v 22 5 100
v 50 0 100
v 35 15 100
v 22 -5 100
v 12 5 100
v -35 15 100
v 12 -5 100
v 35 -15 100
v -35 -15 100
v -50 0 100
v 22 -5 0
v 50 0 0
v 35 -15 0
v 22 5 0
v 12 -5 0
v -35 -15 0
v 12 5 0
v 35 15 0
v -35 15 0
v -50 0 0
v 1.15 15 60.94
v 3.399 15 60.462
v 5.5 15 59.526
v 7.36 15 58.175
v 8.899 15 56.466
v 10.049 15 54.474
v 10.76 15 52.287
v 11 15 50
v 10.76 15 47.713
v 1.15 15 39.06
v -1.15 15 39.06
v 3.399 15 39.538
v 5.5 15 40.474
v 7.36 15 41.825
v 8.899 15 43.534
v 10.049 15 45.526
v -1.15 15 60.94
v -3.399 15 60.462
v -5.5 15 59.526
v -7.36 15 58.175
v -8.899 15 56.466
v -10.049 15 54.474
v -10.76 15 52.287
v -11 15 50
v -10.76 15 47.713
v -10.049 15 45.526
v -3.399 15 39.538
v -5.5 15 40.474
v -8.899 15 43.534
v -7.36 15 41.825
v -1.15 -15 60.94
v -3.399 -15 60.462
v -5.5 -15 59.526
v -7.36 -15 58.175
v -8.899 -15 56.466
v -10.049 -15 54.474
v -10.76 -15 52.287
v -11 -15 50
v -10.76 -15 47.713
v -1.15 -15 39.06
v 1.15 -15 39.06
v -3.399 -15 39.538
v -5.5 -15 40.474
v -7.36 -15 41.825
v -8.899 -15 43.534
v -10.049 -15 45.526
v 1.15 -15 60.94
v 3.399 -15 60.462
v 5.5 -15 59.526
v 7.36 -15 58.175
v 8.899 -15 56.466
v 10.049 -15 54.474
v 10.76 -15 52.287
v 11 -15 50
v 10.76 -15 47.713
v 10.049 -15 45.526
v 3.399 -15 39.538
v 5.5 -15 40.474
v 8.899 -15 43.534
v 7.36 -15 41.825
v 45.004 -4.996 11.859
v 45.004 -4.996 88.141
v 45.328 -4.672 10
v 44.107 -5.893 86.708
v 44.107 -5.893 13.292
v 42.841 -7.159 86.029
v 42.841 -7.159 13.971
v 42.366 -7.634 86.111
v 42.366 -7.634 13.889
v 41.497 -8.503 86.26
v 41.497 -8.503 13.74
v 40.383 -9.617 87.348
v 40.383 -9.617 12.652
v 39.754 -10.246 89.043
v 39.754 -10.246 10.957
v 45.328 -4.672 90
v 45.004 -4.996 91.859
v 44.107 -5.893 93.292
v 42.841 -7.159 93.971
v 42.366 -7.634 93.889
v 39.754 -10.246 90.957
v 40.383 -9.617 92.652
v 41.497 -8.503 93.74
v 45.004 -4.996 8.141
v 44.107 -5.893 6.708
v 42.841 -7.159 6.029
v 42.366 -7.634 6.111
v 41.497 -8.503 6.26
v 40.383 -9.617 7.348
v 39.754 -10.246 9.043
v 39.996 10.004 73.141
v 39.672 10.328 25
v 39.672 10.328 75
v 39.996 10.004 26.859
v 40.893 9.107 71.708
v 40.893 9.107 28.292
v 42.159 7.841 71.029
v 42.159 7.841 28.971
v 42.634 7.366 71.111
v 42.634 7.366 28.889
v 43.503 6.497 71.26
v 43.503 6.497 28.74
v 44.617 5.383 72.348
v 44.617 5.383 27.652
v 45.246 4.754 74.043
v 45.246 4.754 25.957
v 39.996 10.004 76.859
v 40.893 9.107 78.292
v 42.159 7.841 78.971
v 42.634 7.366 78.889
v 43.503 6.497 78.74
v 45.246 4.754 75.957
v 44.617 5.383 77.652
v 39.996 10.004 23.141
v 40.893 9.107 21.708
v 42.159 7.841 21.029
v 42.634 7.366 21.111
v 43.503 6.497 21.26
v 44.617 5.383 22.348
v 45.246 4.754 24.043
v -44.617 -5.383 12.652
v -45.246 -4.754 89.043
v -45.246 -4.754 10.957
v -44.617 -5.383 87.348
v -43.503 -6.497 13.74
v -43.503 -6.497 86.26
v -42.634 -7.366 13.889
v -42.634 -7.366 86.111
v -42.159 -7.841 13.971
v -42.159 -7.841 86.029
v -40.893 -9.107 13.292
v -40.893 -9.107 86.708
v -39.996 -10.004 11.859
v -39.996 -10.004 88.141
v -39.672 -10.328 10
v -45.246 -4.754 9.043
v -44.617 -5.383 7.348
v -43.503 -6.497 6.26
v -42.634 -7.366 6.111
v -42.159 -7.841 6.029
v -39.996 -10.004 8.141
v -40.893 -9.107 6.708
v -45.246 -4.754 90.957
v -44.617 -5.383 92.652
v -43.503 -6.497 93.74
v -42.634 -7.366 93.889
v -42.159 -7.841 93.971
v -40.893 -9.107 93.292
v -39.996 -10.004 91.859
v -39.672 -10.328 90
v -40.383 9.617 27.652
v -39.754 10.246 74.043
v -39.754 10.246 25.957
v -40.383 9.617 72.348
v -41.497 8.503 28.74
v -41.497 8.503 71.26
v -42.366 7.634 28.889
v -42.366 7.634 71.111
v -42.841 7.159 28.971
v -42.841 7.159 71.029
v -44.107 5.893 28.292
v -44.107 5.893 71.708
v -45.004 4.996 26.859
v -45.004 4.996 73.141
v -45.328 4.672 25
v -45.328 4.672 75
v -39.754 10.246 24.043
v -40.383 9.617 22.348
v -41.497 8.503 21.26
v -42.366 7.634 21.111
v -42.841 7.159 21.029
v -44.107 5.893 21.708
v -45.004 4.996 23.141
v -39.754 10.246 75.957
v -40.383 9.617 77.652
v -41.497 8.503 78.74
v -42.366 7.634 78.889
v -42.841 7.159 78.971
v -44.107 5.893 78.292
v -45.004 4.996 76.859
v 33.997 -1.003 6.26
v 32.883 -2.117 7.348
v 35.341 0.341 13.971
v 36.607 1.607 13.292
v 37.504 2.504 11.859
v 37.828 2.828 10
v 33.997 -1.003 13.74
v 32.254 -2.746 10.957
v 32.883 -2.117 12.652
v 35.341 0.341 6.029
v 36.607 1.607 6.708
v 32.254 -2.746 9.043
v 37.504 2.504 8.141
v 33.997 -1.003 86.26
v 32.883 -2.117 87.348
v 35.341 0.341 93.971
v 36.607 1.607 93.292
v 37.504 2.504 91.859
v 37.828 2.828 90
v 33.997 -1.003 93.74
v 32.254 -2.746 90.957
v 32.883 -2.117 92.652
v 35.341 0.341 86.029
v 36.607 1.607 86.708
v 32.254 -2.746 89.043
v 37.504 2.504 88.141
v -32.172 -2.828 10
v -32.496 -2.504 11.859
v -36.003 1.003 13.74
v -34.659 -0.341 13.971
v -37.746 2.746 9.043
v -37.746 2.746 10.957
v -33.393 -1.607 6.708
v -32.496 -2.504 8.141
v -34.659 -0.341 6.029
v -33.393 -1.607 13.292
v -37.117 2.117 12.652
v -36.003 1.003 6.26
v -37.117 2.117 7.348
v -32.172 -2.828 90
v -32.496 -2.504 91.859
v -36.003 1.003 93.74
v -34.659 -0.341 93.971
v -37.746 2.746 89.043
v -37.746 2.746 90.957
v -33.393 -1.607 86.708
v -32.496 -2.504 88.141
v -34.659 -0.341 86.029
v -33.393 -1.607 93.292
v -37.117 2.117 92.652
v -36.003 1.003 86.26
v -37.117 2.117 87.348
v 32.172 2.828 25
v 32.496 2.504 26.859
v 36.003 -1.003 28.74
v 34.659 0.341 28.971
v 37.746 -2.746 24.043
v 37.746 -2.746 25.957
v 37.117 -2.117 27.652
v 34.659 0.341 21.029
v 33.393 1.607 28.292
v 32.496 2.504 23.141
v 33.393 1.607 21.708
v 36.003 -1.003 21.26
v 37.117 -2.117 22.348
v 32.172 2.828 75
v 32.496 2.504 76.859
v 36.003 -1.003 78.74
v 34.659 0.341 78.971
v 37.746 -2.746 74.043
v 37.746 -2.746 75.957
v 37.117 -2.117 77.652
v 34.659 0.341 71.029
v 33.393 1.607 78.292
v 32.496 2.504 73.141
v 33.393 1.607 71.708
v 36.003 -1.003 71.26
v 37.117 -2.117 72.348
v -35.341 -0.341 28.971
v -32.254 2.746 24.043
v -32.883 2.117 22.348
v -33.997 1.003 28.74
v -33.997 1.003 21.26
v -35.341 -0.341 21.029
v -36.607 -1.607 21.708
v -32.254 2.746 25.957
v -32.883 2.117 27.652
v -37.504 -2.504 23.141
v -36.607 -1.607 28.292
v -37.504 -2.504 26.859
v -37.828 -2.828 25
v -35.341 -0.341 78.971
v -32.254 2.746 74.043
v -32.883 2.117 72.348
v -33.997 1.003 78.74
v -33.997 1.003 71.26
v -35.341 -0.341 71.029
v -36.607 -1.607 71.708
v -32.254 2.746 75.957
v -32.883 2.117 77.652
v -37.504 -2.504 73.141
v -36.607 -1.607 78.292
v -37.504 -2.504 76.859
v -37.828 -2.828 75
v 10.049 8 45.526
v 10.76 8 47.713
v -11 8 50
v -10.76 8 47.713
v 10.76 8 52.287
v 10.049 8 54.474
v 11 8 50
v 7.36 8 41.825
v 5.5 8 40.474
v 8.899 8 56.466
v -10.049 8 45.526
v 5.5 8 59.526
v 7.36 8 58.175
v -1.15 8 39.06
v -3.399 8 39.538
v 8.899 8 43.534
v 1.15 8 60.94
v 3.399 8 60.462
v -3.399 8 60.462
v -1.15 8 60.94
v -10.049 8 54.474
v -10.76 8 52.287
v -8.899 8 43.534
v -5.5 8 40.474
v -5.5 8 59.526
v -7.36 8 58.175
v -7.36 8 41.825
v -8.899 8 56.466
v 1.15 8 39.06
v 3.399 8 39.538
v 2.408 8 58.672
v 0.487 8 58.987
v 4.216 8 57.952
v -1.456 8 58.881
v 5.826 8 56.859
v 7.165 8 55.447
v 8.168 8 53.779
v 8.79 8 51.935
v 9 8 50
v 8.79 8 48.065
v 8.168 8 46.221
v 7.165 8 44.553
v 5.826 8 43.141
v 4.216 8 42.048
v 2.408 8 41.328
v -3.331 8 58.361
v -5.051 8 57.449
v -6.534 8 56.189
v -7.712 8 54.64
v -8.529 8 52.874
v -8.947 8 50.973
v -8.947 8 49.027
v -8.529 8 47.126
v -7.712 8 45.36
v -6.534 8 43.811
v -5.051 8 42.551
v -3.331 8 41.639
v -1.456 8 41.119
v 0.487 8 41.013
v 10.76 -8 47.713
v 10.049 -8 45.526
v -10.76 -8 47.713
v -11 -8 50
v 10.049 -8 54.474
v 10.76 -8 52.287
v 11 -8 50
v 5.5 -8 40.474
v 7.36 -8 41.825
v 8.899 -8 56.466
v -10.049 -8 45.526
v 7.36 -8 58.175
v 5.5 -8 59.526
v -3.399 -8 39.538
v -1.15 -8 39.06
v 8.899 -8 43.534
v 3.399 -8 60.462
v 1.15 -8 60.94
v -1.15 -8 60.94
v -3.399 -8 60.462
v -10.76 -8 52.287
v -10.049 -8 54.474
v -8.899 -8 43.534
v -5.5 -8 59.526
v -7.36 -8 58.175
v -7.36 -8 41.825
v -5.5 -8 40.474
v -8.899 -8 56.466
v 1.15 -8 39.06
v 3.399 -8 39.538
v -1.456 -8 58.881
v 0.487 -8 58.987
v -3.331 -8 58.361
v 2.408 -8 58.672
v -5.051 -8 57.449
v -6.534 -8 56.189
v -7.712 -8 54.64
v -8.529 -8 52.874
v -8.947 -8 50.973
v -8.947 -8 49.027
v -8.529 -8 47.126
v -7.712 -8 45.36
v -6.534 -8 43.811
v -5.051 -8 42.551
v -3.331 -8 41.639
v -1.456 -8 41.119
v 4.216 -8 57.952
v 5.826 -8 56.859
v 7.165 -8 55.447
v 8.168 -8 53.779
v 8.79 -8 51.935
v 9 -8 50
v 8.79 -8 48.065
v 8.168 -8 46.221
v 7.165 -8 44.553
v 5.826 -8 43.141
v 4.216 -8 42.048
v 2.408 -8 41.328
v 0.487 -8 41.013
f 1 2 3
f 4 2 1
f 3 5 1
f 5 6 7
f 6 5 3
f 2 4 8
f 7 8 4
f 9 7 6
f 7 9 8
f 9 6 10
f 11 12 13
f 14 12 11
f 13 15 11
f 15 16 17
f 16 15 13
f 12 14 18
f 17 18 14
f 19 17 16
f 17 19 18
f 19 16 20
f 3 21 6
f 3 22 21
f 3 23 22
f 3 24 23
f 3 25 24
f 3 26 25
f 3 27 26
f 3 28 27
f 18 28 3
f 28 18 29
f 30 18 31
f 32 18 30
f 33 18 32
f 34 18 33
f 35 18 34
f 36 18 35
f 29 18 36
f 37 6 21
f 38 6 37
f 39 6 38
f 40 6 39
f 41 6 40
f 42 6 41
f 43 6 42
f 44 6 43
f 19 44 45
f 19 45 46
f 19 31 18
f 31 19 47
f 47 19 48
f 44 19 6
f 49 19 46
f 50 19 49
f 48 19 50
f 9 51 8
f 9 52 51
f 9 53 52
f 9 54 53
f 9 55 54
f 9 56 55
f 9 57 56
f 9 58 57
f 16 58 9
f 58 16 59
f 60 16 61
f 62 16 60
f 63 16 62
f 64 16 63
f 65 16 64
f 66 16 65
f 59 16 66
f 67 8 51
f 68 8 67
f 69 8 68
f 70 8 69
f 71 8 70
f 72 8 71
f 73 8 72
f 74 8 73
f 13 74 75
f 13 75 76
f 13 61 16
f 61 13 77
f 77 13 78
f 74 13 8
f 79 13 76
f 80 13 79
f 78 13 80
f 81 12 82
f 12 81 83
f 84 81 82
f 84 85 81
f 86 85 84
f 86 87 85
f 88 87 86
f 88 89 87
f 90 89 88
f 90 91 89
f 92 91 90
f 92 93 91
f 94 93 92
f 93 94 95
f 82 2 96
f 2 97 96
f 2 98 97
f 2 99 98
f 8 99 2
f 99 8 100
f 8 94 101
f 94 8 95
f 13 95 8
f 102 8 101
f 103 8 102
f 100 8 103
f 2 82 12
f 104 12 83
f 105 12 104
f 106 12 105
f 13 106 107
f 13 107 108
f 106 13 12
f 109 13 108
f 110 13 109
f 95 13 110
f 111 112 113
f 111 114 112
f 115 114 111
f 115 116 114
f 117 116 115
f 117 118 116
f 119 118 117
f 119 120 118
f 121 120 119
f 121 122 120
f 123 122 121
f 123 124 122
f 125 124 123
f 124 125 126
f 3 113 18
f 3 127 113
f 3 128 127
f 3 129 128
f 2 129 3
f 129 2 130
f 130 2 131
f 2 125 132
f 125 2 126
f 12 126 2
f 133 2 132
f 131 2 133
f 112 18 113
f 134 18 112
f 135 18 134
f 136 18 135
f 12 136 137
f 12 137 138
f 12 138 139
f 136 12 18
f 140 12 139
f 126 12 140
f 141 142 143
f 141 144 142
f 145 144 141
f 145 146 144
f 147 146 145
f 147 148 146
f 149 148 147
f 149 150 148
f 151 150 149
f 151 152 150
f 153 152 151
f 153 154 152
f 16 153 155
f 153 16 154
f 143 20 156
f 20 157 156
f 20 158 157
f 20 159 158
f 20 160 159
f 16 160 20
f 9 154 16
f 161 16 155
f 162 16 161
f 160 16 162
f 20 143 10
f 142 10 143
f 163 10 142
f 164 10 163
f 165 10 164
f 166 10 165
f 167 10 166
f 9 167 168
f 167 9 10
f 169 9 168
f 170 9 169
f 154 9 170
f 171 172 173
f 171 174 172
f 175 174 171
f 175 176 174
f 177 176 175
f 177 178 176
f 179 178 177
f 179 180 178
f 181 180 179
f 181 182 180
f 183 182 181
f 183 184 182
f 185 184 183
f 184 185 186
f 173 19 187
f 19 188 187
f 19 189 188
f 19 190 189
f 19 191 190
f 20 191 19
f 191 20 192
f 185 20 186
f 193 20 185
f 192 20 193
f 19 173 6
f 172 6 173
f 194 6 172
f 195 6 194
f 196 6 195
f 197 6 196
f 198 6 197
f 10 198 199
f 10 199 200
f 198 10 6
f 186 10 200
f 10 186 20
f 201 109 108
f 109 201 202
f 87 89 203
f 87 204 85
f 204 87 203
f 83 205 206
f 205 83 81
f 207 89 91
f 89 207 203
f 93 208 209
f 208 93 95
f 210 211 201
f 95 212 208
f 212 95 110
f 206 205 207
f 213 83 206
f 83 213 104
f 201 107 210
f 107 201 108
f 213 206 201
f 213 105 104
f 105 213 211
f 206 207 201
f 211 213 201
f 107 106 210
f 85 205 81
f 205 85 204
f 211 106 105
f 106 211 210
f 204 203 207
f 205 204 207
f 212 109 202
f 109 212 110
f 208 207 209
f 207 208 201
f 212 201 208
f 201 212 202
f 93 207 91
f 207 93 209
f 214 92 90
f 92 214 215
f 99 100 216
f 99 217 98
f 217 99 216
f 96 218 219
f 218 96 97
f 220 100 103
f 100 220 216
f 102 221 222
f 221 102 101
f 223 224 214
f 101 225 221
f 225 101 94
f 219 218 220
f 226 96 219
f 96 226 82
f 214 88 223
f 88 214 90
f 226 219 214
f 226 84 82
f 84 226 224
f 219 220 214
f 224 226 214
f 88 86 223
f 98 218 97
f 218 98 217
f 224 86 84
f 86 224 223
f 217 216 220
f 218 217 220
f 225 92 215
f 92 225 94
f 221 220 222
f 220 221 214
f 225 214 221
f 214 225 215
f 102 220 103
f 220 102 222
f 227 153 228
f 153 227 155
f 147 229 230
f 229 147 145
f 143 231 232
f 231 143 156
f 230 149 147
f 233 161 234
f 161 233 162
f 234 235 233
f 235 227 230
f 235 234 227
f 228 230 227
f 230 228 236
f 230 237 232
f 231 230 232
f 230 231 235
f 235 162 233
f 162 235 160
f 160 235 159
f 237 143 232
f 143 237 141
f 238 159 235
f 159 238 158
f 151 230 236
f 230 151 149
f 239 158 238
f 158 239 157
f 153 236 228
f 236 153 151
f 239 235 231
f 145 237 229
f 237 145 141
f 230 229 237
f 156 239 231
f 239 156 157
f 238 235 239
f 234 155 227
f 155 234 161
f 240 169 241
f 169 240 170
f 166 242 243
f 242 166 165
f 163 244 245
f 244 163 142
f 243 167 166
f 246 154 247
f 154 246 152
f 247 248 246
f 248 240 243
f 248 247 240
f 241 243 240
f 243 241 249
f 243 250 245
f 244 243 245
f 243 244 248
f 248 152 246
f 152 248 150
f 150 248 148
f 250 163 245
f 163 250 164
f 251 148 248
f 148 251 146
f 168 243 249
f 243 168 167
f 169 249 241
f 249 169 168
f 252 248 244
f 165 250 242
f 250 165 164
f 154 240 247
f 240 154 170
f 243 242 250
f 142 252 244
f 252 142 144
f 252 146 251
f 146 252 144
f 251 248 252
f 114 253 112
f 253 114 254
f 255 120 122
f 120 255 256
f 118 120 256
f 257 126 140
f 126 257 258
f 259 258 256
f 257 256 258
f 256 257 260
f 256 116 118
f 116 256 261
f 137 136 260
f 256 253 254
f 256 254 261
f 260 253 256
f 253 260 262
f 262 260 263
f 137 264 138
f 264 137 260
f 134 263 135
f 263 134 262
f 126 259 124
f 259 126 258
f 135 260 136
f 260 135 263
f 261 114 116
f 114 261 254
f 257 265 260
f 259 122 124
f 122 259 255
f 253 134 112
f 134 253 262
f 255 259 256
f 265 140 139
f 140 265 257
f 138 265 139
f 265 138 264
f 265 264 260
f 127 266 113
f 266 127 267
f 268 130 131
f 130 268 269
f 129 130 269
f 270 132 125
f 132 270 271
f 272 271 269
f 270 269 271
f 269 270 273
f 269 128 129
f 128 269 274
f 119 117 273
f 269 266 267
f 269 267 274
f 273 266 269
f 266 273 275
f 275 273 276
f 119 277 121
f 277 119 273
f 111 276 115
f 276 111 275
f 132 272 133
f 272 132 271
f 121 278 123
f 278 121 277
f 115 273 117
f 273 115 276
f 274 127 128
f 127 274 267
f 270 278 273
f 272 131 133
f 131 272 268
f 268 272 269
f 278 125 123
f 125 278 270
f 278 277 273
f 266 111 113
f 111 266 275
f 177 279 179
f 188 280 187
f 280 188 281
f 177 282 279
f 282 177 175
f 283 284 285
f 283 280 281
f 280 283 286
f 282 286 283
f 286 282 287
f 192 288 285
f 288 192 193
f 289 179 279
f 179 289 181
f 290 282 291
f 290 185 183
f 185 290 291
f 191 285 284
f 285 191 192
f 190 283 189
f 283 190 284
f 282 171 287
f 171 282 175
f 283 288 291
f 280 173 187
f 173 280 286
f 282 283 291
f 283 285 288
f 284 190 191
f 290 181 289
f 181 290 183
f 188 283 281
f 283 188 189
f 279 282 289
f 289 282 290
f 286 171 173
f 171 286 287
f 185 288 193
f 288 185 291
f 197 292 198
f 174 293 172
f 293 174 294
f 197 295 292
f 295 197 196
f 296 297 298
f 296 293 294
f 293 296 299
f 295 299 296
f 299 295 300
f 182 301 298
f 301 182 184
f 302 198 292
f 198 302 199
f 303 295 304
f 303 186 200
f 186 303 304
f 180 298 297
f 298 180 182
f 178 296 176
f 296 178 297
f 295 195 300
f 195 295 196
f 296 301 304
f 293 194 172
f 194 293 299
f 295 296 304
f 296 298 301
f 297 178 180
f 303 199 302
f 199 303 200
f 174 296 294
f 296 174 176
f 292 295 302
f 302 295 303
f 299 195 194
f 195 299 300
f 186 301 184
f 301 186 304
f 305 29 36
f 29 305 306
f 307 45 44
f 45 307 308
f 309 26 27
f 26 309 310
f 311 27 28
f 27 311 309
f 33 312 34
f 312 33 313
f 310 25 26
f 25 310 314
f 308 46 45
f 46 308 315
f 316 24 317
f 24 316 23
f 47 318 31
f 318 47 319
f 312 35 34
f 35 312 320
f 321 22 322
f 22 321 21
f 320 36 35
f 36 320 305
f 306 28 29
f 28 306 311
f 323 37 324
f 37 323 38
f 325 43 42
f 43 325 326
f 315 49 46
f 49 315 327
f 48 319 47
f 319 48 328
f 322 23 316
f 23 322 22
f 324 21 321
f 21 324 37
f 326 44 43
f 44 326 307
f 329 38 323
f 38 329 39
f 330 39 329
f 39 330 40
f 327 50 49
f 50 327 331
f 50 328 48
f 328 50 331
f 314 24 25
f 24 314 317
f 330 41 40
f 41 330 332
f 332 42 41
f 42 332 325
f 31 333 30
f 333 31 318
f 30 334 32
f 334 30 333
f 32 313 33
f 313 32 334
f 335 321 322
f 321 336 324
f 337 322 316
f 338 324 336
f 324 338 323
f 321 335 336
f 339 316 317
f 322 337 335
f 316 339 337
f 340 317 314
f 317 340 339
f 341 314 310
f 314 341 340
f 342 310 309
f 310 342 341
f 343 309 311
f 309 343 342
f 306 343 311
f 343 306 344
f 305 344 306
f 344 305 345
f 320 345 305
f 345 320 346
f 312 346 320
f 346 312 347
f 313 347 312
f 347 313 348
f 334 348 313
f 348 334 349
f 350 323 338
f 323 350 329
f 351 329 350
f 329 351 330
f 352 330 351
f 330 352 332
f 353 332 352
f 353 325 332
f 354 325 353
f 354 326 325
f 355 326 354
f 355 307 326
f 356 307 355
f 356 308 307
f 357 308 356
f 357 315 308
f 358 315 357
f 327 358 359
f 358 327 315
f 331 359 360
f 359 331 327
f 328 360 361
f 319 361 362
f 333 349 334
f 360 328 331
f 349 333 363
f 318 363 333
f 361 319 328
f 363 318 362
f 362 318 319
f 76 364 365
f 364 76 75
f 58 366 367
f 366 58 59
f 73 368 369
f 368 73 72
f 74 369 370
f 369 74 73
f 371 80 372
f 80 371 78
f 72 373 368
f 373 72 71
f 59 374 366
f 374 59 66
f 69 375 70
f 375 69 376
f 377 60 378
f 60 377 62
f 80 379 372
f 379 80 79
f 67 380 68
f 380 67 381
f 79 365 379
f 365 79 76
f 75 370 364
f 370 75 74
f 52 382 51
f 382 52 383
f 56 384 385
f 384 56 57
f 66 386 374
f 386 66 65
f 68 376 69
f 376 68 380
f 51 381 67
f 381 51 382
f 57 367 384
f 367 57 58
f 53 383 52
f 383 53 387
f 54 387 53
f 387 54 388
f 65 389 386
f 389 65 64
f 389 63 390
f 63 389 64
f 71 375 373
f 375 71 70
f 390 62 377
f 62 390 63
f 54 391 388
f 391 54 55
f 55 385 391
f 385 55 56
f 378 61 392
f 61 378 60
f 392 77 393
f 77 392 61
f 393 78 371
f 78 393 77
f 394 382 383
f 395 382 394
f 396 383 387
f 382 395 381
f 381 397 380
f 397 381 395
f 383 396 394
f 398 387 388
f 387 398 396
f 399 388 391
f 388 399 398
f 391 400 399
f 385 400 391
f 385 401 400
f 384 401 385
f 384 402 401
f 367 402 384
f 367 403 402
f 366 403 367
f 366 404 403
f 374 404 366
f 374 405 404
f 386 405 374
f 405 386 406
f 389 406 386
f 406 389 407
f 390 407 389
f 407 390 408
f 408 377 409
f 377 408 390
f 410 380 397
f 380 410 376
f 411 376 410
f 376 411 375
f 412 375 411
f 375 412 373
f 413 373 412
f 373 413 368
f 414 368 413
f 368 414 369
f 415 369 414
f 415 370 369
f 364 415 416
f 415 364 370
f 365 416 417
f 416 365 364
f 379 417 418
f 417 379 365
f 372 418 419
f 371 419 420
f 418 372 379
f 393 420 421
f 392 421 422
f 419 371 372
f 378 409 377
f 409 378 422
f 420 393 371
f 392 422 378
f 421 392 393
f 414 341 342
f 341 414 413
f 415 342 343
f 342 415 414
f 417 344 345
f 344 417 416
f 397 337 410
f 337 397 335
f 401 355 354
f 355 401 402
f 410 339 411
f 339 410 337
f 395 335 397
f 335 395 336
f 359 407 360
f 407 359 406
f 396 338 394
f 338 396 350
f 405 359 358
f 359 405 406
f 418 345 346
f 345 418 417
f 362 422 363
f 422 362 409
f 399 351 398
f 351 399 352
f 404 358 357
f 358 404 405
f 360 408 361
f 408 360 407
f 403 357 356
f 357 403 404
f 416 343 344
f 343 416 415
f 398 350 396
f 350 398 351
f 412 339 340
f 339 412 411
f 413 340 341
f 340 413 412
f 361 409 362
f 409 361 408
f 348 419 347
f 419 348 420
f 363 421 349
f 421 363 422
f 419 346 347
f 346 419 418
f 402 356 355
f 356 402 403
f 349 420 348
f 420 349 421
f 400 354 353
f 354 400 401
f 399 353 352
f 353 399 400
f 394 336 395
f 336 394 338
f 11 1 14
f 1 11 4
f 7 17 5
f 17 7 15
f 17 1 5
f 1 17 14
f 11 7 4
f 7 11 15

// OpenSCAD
screwDiam = 8;
dollyX = 70;
dollyY = 30;
dollyZ = 100;


beltWidth = 6;
beltHeigth = 1.5;

module mainbody() {
	union(){
		translate([-dollyX/2, -dollyY/2,0]) cube([dollyX,dollyY,dollyZ]);
		translate([dollyX/2,0,0]) rotate([0,0,45]) translate([-sqrt((dollyY*dollyY)/2)/2,-sqrt((dollyY*dollyY)/2)/2,0]) cube([sqrt((dollyY*dollyY)/2),sqrt((dollyY*dollyY)/2),dollyZ]);
		translate([-35,0,0]) rotate([0,0,45]) translate([-sqrt(450)/2,-sqrt((dollyY*dollyY)/2)/2,0]) cube([sqrt((dollyY*dollyY)/2),sqrt((dollyY*dollyY)/2),dollyZ]);
	}
}

module axesholes() {
	translate([35,0,10])rotate([90,0,45])cylinder(h=30,r=screwDiam/2);
	translate([35,0,dollyZ-10])rotate([90,0,45])cylinder(h=30,r=screwDiam/2);
	translate([-35,0,10])rotate([90,0,-45])cylinder(h=30,r=screwDiam/2);
	translate([-35,0,dollyZ-10])rotate([90,0,-45])cylinder(h=30,r=screwDiam/2);

	translate([35,0,25])rotate([90,0,135])cylinder(h=30,r=screwDiam/2);
	translate([35,0,dollyZ-25])rotate([90,0,135])cylinder(h=30,r=screwDiam/2);
	translate([-35,0,25])rotate([90,0,-135])cylinder(h=30,r=screwDiam/2);
	translate([-35,0,dollyZ-25])rotate([90,0,-135])cylinder(h=30,r=screwDiam/2);
}

module ballBearing() {
	translate([0,3.5,0])rotate([90,0,0])cylinder(r=11,h=7);
}

module centralMount() {
	translate([0,dollyY/2-3.5,dollyZ/2])ballBearing();
	translate([0,-(dollyY/2-3.5),dollyZ/2])ballBearing();
	translate([0,15,dollyZ/2])rotate([90,0,0])cylinder(r=9,h=30);
}

module beltSlot() {
	translate([12,-5,0])cube([10,10,dollyZ]);
}

module complete() {
	difference() {
		mainbody();
		axesholes();
		centralMount();
		beltSlot();
	}
}

complete();
